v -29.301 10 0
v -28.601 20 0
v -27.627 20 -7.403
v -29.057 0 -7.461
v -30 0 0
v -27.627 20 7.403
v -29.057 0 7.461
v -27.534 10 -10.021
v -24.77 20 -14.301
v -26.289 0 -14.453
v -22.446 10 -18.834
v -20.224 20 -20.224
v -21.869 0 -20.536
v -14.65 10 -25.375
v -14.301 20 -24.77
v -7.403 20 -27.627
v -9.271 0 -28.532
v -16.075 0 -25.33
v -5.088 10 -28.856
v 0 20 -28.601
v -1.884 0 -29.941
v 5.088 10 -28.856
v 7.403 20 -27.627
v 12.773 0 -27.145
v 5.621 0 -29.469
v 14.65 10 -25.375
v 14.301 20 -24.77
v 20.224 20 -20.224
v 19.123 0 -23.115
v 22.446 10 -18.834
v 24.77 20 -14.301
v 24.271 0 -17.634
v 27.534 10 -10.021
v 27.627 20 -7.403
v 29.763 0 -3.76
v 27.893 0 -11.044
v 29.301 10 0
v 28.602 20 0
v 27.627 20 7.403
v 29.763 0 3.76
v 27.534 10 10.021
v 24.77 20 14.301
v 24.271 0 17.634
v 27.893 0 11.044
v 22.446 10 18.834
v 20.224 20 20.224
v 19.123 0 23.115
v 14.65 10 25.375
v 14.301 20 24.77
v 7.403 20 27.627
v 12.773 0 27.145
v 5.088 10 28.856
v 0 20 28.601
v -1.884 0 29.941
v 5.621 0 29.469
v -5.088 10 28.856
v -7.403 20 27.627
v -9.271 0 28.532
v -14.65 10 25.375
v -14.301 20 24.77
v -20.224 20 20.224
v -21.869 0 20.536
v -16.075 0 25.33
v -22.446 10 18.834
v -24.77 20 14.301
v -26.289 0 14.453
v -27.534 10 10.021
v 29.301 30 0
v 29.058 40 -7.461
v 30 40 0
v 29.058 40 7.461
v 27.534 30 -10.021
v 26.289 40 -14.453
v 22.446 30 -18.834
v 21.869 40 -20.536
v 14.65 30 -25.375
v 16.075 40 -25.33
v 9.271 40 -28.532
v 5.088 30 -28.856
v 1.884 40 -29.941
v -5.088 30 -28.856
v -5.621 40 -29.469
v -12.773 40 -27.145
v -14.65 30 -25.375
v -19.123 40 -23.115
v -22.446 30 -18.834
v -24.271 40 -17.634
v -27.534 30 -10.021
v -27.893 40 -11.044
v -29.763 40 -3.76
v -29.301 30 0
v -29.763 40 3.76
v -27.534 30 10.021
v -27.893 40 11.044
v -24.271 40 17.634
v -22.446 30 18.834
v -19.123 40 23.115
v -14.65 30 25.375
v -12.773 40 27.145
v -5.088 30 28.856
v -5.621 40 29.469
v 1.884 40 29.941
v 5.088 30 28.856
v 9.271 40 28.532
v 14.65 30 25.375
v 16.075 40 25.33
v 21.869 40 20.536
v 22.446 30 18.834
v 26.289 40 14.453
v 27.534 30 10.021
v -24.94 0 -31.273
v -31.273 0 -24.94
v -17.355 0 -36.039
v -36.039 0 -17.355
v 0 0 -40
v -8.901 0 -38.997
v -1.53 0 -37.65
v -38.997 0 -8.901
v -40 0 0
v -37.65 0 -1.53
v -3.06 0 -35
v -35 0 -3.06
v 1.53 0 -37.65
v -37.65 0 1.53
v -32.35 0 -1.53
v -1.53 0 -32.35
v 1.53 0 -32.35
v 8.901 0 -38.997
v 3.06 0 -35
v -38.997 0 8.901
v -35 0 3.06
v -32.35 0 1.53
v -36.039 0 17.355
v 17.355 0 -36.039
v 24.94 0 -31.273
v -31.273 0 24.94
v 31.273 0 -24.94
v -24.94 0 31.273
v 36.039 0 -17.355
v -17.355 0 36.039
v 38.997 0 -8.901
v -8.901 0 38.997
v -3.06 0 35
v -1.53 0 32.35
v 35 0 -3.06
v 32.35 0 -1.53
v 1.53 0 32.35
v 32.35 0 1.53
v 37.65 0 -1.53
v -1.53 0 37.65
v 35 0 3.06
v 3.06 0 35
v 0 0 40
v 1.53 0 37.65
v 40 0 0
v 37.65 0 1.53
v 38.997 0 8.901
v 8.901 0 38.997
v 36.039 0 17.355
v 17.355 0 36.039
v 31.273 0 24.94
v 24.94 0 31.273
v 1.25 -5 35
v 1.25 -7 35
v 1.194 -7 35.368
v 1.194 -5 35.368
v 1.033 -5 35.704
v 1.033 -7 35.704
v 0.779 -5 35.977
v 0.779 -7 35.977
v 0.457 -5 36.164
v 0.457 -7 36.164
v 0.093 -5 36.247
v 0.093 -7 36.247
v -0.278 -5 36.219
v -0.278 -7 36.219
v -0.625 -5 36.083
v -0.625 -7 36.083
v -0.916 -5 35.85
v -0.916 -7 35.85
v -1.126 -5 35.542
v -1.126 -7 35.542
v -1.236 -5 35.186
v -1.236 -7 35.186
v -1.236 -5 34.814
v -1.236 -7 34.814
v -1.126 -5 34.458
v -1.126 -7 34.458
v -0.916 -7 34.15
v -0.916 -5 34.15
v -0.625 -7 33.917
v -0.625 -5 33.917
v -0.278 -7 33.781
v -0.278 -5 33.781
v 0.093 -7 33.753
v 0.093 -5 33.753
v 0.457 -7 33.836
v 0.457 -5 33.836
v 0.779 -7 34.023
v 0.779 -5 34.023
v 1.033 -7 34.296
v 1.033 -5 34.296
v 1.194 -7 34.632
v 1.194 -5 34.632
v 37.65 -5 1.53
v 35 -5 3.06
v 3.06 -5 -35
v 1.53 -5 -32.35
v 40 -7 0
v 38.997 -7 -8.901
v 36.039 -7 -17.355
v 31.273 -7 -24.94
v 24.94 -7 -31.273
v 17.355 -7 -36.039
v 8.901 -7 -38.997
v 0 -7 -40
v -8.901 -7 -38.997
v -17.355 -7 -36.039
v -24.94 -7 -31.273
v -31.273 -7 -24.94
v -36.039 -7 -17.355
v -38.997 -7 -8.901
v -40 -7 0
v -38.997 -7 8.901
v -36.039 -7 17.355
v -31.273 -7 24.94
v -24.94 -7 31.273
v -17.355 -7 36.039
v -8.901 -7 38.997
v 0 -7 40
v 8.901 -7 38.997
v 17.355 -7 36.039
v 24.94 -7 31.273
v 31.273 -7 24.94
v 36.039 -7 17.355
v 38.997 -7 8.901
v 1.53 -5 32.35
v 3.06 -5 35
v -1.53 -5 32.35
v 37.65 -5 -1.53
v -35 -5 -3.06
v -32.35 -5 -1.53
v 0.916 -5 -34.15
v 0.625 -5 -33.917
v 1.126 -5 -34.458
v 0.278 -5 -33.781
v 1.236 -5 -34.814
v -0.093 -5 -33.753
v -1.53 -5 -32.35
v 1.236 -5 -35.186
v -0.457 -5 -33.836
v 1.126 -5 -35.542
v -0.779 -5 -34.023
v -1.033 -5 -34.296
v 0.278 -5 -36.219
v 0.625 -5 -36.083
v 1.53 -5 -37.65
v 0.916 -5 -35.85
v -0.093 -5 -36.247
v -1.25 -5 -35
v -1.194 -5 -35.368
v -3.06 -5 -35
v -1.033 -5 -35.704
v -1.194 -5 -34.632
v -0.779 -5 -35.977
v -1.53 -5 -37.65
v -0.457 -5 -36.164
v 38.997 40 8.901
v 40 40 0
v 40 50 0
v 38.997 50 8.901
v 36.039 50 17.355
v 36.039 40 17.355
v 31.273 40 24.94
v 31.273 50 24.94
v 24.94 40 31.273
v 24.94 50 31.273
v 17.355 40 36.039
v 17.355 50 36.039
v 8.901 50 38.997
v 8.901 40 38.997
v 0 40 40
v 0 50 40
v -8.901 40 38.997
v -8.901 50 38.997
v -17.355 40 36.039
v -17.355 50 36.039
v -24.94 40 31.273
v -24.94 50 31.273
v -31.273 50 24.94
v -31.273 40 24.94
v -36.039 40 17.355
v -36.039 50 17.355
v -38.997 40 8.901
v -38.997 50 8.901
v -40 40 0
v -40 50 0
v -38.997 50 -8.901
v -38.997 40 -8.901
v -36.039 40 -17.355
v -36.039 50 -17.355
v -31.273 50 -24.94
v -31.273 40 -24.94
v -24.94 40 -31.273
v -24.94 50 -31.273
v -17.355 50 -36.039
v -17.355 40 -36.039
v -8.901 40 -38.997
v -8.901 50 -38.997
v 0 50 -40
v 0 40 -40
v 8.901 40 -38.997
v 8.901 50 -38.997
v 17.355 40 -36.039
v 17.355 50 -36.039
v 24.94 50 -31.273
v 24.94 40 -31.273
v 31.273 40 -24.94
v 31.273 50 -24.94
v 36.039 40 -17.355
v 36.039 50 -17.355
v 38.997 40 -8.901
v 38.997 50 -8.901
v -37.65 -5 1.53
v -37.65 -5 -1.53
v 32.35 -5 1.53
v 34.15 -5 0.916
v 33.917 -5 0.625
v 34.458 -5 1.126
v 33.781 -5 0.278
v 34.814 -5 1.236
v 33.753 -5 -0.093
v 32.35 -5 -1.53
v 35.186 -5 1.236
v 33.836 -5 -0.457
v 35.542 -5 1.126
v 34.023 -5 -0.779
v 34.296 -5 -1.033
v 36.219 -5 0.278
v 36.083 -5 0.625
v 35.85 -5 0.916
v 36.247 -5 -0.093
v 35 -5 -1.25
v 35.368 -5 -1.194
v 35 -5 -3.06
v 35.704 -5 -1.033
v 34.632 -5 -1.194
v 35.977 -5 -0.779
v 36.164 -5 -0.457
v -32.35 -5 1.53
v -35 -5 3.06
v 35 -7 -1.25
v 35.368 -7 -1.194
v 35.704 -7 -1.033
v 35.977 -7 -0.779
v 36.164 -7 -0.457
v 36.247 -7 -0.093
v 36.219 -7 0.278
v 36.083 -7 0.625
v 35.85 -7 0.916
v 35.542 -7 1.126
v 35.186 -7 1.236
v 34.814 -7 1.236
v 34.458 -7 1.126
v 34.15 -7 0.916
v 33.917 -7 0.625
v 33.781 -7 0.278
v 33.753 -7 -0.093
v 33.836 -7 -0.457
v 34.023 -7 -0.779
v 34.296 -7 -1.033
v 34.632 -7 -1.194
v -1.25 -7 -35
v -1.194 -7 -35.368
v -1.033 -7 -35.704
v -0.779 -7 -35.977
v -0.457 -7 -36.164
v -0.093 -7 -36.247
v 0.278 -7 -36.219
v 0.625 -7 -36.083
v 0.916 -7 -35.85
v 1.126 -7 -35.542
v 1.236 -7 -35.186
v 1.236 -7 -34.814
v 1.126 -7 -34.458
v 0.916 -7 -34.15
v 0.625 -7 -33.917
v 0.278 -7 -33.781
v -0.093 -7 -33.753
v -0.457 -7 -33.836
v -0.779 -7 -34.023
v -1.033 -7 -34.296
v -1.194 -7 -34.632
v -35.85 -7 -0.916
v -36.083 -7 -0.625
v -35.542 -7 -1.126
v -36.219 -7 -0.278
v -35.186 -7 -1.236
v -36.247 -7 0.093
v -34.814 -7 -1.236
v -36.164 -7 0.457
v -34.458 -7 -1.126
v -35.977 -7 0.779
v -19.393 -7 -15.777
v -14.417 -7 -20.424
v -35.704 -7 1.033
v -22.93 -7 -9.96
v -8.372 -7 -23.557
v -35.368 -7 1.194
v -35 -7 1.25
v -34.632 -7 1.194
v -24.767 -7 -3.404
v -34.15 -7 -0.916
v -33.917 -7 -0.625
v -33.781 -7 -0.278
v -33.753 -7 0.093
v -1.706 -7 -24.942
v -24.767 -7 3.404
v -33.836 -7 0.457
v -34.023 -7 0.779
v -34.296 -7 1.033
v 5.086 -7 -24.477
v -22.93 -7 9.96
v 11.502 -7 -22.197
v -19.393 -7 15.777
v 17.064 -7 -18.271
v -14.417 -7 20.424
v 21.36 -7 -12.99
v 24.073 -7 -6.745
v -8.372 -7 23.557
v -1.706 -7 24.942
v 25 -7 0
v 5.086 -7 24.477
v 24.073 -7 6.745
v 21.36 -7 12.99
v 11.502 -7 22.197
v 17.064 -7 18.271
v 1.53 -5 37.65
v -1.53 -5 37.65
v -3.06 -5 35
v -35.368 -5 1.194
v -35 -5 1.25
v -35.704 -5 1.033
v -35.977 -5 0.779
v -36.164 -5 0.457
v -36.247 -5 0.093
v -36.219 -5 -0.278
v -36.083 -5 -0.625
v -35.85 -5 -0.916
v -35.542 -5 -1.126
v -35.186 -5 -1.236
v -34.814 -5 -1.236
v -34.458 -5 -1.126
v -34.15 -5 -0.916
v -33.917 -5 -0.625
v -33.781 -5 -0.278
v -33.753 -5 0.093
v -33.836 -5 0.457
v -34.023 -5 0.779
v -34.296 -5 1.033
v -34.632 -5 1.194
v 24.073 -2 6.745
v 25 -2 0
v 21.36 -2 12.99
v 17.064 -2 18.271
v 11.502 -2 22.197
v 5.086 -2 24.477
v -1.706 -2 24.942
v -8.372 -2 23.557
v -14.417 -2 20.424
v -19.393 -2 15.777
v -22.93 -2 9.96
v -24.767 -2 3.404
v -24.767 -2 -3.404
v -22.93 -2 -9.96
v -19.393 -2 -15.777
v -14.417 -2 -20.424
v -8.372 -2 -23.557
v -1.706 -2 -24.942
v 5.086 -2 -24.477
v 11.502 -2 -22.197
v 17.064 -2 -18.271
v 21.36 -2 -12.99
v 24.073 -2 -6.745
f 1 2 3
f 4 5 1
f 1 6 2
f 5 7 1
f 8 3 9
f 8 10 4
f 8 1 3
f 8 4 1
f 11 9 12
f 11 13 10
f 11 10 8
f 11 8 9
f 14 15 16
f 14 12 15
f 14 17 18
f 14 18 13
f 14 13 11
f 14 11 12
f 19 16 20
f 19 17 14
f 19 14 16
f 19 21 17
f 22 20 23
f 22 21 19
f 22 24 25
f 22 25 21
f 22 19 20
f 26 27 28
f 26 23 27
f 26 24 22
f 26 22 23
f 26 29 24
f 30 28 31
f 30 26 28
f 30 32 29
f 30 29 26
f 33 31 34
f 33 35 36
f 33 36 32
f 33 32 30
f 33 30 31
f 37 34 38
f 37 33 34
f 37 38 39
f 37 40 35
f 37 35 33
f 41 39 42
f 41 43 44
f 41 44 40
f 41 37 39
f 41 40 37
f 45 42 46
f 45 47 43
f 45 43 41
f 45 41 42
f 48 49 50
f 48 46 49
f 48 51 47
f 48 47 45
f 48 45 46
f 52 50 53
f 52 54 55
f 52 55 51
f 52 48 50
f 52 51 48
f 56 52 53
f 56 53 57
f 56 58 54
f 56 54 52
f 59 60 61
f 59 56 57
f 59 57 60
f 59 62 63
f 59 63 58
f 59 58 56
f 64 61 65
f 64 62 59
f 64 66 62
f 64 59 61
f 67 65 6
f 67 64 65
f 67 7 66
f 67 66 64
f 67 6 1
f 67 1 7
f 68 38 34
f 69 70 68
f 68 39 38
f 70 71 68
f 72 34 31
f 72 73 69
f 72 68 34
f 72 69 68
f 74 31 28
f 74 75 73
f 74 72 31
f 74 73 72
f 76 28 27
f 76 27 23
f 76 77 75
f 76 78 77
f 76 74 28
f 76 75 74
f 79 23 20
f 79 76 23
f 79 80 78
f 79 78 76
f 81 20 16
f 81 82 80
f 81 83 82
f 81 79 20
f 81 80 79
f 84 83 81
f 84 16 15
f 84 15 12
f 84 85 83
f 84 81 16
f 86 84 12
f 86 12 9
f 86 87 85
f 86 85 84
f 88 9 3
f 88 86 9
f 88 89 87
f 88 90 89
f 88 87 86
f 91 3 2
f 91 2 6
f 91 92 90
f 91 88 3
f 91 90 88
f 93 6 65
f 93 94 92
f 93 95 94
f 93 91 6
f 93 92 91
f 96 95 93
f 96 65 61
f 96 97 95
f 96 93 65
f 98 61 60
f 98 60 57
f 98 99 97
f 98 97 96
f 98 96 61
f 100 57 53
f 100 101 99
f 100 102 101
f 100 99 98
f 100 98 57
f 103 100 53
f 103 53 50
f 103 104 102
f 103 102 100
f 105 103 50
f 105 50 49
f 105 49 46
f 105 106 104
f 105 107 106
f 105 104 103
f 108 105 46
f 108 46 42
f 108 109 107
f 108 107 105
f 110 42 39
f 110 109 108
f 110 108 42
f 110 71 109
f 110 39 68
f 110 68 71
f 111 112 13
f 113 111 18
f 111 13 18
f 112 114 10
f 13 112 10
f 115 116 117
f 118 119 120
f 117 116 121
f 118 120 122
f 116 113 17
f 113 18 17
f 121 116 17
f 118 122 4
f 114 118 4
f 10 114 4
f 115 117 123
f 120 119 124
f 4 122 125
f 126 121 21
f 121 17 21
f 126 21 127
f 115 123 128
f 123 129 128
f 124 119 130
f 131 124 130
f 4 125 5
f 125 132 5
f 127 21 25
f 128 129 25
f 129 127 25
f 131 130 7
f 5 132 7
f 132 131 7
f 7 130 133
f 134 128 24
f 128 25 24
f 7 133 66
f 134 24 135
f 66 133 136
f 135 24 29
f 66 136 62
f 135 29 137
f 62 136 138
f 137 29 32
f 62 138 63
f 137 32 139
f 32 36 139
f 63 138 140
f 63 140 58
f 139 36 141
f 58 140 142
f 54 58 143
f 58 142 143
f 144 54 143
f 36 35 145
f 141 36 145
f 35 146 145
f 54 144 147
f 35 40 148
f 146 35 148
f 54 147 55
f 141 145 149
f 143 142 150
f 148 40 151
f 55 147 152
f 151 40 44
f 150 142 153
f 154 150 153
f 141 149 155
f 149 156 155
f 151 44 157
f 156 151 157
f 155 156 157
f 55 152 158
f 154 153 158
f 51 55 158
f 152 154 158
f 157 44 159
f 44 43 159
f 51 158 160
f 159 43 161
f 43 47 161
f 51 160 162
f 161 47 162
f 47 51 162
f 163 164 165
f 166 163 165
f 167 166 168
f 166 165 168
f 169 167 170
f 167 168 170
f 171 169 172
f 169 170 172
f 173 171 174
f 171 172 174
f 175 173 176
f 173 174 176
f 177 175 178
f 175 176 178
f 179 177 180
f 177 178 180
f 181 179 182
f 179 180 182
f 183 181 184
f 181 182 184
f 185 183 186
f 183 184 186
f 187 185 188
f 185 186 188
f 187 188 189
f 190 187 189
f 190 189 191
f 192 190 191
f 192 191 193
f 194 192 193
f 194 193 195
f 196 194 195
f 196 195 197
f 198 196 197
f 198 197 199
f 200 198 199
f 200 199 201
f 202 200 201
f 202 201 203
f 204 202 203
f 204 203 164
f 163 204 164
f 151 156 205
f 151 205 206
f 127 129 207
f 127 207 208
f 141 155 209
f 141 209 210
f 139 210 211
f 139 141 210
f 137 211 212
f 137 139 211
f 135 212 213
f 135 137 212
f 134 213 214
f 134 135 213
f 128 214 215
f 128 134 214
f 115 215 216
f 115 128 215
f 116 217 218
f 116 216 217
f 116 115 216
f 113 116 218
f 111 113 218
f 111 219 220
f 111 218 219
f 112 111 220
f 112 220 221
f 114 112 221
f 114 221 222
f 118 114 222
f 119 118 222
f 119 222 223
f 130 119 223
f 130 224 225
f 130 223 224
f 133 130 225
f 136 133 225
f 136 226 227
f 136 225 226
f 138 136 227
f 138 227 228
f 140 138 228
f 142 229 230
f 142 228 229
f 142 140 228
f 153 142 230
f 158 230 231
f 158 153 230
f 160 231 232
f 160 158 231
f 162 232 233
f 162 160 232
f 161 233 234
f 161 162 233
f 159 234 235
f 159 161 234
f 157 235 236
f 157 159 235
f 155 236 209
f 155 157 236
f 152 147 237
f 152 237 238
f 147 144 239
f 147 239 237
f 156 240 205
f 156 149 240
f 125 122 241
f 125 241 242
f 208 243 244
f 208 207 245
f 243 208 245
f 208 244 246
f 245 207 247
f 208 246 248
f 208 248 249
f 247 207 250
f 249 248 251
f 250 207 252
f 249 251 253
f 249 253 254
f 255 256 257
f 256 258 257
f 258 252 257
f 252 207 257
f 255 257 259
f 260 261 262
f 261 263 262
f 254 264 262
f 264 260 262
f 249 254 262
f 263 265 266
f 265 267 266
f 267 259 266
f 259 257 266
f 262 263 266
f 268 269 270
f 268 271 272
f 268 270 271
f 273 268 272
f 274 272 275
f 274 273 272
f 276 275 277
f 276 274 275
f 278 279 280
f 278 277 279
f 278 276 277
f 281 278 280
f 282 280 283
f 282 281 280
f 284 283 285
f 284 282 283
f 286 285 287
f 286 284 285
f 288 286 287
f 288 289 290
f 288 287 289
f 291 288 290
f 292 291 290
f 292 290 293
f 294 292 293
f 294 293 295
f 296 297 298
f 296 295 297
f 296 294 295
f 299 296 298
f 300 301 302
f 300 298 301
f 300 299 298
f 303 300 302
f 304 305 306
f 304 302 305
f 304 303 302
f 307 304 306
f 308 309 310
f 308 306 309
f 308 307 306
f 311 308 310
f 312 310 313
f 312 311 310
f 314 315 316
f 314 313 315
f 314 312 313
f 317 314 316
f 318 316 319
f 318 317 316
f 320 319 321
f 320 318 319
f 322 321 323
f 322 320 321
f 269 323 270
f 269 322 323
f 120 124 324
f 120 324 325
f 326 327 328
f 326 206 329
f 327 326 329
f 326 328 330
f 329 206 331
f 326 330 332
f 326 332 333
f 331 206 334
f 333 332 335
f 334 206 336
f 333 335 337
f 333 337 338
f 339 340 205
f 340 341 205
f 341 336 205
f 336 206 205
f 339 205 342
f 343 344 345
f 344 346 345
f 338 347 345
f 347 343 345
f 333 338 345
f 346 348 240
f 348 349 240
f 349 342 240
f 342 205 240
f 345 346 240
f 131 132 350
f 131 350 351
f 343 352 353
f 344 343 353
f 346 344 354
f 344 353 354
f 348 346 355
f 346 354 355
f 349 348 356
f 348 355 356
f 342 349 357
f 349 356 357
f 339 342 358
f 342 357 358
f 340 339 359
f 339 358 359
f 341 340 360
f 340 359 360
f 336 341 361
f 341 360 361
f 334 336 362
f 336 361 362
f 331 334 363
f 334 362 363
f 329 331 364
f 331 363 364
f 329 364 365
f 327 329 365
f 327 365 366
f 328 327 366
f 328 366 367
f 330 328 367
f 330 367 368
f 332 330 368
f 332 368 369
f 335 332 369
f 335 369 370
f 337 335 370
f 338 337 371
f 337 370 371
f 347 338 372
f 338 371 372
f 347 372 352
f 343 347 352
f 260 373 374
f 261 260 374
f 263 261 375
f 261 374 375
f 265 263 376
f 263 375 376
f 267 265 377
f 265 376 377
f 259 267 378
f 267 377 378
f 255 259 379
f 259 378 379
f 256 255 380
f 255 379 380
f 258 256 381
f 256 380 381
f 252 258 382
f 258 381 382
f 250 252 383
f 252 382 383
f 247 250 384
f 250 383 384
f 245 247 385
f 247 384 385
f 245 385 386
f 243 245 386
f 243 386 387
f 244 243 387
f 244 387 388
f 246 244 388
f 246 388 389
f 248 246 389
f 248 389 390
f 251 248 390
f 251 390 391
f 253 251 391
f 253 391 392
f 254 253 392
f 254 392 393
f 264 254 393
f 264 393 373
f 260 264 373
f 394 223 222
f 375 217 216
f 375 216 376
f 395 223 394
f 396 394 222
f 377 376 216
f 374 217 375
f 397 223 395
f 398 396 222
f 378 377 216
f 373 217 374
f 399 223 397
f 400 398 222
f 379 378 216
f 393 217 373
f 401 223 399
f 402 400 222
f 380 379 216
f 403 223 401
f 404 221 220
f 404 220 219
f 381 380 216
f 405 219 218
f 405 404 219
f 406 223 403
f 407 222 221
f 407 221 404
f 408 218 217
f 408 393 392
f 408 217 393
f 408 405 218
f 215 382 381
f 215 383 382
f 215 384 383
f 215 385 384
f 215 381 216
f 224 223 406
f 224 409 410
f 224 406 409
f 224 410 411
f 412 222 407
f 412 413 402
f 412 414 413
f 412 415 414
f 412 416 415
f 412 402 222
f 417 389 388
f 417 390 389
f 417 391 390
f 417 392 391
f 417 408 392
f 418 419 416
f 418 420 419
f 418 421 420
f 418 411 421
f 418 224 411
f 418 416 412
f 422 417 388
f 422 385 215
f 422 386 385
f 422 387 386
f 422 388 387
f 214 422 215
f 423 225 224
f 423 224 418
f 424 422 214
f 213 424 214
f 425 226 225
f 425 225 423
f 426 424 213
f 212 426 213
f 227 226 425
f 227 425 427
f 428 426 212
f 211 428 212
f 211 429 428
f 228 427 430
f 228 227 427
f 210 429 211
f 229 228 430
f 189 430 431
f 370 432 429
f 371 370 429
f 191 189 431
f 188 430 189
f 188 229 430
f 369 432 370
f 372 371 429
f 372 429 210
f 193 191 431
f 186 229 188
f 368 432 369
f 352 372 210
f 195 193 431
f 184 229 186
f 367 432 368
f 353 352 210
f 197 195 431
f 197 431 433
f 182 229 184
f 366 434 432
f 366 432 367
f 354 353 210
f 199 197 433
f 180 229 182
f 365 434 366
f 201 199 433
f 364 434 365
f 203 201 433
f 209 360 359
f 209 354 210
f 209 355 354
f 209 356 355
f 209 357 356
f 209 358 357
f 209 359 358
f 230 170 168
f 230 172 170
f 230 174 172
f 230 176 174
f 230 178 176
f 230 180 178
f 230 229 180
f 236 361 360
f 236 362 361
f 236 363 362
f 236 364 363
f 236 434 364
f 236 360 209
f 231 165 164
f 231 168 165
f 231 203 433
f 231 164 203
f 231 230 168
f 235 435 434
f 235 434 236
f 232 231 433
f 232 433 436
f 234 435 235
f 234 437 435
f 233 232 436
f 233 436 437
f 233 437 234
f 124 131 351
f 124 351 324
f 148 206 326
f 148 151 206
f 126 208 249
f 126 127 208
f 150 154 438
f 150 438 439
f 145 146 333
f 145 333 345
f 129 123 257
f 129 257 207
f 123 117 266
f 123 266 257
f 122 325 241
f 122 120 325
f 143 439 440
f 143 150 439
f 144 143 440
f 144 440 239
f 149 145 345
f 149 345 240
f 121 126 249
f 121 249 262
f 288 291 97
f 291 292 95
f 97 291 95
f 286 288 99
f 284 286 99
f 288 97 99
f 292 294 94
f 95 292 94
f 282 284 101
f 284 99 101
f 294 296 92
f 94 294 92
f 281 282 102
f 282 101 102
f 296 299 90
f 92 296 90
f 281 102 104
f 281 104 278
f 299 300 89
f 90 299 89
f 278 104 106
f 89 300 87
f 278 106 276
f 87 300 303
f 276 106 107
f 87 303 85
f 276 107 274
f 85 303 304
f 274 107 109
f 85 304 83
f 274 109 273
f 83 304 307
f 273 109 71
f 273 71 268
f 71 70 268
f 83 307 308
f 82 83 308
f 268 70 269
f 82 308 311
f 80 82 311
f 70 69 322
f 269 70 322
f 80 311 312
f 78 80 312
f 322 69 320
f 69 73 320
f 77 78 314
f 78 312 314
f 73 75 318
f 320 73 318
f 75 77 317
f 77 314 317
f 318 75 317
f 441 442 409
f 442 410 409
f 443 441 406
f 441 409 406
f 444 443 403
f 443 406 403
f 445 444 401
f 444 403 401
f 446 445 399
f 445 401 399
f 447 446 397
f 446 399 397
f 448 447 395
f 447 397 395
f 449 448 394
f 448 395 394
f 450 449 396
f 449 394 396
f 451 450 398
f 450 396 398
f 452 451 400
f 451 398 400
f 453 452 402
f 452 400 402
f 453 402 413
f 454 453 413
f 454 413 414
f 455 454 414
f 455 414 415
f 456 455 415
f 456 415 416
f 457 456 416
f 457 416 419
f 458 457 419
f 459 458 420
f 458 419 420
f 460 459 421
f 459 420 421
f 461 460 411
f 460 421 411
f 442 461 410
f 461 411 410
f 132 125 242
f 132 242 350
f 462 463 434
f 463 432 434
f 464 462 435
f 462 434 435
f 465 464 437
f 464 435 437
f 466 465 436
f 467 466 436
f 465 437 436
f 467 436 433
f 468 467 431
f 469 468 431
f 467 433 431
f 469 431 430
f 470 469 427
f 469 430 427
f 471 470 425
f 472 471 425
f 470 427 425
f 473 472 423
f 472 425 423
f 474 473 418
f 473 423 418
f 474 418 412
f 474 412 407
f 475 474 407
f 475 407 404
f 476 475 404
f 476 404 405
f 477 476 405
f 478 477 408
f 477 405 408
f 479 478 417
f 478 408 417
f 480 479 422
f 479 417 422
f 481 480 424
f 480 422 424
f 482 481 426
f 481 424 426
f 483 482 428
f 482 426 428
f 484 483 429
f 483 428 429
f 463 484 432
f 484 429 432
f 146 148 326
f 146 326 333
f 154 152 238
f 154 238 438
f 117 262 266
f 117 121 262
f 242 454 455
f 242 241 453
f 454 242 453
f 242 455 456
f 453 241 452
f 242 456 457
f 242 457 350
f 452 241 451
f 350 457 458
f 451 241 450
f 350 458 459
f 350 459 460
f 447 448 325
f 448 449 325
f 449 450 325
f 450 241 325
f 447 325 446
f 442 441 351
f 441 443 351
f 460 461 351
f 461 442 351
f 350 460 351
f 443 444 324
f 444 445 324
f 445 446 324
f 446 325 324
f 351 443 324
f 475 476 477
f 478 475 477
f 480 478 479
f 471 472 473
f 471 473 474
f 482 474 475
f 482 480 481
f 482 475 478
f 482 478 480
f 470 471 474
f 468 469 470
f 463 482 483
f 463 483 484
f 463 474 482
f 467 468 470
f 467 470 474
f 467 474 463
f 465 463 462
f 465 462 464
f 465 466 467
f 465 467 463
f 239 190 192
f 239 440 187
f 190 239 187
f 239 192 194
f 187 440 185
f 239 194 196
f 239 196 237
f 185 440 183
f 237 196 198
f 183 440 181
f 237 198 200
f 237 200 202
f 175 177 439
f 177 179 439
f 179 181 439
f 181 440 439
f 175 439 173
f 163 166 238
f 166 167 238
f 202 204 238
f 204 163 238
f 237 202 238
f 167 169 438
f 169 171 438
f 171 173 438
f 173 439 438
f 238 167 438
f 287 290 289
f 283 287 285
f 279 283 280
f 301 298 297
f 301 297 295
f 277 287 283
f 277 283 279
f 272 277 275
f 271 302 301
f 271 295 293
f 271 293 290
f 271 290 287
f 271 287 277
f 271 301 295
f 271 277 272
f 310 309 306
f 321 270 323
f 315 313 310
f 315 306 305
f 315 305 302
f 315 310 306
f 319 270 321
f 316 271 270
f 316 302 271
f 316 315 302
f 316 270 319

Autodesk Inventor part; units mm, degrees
ref_plane "YZ Plane" through (0, 0, 0) normal (1, 0, 0) x (0, 1, 0)
ref_plane "XZ Plane" through (0, 0, 0) normal (0, 1, 0) x (-1, 0, 0)
ref_plane "XY Plane" through (0, 0, 0) normal (0, 0, 1) x (1, 0, 0)
sketch "Sketch1" plane through (0, 0, 0) normal (0, 1, 0) x (-1, 0, 0)
  circle A0 centre (0, 0) radius 30
  circle A1 centre (0, 0) radius 45
  circle A2 centre (0, 0) radius 20
  dimension "d0" = 60
  dimension "d1" = 90
  dimension "d2" = 40
extrude "Extrusion1" add sketch "Sketch1" along normal blind 20 draft -4 contours A0
sketch "Sketch2" plane through (0, 20, 0) normal (0, 1, 0) x (1, 0, 0)
  circle A0 centre (0, 0) radius 28.6015
  circle A1 centre (0, 0) radius 21.3985
extrude "Extrusion2" add sketch "Sketch2" along normal blind 20 draft 4
sketch "Sketch3" plane through (0, 40, 0) normal (0, 1, 0) x (1, 0, 0)
  circle A0 centre (0, 0) radius 40
  dimension "d7" = 80
extrude "Extrusion3" add sketch "Sketch3" along normal blind 10
sketch "Sketch4" plane through (0, 0, 0) normal (0, -1, 0) x (1, 0, 0)
  circle A0 centre (0, 0) radius 40
  dimension "d10" = 80
extrude "Extrusion4" add sketch "Sketch4" along normal blind 10
ref_plane "Work Plane1" through (0, -8, 0) normal (0, -1, 0) x (1, 0, 0)
sketch "Sketch7" plane through (0, -10, 0) normal (0, -1, 0) x (1, 0, 0)
  circle A0 centre (0, 0) radius 40
extrude "Extrusion12" cut sketch "Sketch7" against normal blind 3
sketch "Sketch8" plane through (0, -7, 0) normal (0, -1, 0) x (1, 0, 0)
  circle A0 centre (0, 0) radius 25
  dimension "d42" = 50
extrude "Extrusion13" cut sketch "Sketch8" against normal blind 5
sketch "Sketch9" plane through (0, 0, 0) normal (0, 1, 0) x (1, 0, 0)
  circle A0 centre (0, 0) radius 35
  line L0 (-37.65, 1.53) -> (-35, 3.06)
  line L1 (-35, 3.06) -> (-32.35, 1.53)
  line L2 (-32.35, 1.53) -> (-32.35, -1.53)
  line L3 (-32.35, -1.53) -> (-35, -3.06)
  line L4 (-35, -3.06) -> (-37.65, -1.53)
  line L5 (-37.65, -1.53) -> (-37.65, 1.53)
  line L6 (0, 0) -> (-35, 0) construction
  circle A1 centre (-35, 0) radius 2.65
  point P0 (-33.675, 2.295)
  point P1 (-36.325, -2.295)
  dimension "d45" = 70
  dimension "d46" = 5.3
extrude "Extrusion14" cut sketch "Sketch9" against normal through all contours L1 A1 A0 | A0 A1 L0 L1 | L3 L4 A1 A0 | A0 A1 L3 | A1 A0 | A0 A1 | L1 L2 A1 | A1 L2 L3 | A1 L5 L0 | L4 L5 A1
pattern_circular "Circular Pattern1" count 4 over 360 about axis through (0, 0, 0) along (0, -1, 0) of "Extrusion14"
sketch "Sketch10" plane through (0, 0, 0) normal (0, 0, 1) x (1, 0, 0)
  point P0 (0, 0)
sketch "Sketch11" plane through (0, 0, 0) normal (0, 0, 1) x (1, 0, 0)
  line L0 (-24.5677, 41.8645) -> (0, 41.8645)
  line L1 (0, 41.8645) -> (0, 0)
  line L2 (0, 0) -> (-24.5677, 0)
  line L3 (-24.5677, 0) -> (-24.5677, 41.8645)
revolve "Revolution1" add sketch "Sketch11" angle 360 about axis through (0, 41.8645, 0) along (0, -1, 0)
sketch "Sketch12" plane through (0, -7, 0) normal (0, -1, 0) x (1, 0, 0)
  point P0 (0, 0)
sketch "Sketch13" plane through (0, -7, 0) normal (0, -1, 0) x (1, 0, 0)
  line L0 (0, 35) -> (0, 0) construction
  circle A0 centre (0, 35) radius 3.15
  circle A1 centre (0, 35) radius 1.25
  dimension "d53" = 35
  dimension "d54" = 6.3
  dimension "d57" = 2.5
extrude "Extrusion15" add sketch "Sketch13" against normal blind 2
pattern_circular "Circular Pattern2" count 4 over 360 about axis through (0, 0, 0) along (0, -1, 0) of "Extrusion15"
properties part number "spool" material "ABS Plastic"
